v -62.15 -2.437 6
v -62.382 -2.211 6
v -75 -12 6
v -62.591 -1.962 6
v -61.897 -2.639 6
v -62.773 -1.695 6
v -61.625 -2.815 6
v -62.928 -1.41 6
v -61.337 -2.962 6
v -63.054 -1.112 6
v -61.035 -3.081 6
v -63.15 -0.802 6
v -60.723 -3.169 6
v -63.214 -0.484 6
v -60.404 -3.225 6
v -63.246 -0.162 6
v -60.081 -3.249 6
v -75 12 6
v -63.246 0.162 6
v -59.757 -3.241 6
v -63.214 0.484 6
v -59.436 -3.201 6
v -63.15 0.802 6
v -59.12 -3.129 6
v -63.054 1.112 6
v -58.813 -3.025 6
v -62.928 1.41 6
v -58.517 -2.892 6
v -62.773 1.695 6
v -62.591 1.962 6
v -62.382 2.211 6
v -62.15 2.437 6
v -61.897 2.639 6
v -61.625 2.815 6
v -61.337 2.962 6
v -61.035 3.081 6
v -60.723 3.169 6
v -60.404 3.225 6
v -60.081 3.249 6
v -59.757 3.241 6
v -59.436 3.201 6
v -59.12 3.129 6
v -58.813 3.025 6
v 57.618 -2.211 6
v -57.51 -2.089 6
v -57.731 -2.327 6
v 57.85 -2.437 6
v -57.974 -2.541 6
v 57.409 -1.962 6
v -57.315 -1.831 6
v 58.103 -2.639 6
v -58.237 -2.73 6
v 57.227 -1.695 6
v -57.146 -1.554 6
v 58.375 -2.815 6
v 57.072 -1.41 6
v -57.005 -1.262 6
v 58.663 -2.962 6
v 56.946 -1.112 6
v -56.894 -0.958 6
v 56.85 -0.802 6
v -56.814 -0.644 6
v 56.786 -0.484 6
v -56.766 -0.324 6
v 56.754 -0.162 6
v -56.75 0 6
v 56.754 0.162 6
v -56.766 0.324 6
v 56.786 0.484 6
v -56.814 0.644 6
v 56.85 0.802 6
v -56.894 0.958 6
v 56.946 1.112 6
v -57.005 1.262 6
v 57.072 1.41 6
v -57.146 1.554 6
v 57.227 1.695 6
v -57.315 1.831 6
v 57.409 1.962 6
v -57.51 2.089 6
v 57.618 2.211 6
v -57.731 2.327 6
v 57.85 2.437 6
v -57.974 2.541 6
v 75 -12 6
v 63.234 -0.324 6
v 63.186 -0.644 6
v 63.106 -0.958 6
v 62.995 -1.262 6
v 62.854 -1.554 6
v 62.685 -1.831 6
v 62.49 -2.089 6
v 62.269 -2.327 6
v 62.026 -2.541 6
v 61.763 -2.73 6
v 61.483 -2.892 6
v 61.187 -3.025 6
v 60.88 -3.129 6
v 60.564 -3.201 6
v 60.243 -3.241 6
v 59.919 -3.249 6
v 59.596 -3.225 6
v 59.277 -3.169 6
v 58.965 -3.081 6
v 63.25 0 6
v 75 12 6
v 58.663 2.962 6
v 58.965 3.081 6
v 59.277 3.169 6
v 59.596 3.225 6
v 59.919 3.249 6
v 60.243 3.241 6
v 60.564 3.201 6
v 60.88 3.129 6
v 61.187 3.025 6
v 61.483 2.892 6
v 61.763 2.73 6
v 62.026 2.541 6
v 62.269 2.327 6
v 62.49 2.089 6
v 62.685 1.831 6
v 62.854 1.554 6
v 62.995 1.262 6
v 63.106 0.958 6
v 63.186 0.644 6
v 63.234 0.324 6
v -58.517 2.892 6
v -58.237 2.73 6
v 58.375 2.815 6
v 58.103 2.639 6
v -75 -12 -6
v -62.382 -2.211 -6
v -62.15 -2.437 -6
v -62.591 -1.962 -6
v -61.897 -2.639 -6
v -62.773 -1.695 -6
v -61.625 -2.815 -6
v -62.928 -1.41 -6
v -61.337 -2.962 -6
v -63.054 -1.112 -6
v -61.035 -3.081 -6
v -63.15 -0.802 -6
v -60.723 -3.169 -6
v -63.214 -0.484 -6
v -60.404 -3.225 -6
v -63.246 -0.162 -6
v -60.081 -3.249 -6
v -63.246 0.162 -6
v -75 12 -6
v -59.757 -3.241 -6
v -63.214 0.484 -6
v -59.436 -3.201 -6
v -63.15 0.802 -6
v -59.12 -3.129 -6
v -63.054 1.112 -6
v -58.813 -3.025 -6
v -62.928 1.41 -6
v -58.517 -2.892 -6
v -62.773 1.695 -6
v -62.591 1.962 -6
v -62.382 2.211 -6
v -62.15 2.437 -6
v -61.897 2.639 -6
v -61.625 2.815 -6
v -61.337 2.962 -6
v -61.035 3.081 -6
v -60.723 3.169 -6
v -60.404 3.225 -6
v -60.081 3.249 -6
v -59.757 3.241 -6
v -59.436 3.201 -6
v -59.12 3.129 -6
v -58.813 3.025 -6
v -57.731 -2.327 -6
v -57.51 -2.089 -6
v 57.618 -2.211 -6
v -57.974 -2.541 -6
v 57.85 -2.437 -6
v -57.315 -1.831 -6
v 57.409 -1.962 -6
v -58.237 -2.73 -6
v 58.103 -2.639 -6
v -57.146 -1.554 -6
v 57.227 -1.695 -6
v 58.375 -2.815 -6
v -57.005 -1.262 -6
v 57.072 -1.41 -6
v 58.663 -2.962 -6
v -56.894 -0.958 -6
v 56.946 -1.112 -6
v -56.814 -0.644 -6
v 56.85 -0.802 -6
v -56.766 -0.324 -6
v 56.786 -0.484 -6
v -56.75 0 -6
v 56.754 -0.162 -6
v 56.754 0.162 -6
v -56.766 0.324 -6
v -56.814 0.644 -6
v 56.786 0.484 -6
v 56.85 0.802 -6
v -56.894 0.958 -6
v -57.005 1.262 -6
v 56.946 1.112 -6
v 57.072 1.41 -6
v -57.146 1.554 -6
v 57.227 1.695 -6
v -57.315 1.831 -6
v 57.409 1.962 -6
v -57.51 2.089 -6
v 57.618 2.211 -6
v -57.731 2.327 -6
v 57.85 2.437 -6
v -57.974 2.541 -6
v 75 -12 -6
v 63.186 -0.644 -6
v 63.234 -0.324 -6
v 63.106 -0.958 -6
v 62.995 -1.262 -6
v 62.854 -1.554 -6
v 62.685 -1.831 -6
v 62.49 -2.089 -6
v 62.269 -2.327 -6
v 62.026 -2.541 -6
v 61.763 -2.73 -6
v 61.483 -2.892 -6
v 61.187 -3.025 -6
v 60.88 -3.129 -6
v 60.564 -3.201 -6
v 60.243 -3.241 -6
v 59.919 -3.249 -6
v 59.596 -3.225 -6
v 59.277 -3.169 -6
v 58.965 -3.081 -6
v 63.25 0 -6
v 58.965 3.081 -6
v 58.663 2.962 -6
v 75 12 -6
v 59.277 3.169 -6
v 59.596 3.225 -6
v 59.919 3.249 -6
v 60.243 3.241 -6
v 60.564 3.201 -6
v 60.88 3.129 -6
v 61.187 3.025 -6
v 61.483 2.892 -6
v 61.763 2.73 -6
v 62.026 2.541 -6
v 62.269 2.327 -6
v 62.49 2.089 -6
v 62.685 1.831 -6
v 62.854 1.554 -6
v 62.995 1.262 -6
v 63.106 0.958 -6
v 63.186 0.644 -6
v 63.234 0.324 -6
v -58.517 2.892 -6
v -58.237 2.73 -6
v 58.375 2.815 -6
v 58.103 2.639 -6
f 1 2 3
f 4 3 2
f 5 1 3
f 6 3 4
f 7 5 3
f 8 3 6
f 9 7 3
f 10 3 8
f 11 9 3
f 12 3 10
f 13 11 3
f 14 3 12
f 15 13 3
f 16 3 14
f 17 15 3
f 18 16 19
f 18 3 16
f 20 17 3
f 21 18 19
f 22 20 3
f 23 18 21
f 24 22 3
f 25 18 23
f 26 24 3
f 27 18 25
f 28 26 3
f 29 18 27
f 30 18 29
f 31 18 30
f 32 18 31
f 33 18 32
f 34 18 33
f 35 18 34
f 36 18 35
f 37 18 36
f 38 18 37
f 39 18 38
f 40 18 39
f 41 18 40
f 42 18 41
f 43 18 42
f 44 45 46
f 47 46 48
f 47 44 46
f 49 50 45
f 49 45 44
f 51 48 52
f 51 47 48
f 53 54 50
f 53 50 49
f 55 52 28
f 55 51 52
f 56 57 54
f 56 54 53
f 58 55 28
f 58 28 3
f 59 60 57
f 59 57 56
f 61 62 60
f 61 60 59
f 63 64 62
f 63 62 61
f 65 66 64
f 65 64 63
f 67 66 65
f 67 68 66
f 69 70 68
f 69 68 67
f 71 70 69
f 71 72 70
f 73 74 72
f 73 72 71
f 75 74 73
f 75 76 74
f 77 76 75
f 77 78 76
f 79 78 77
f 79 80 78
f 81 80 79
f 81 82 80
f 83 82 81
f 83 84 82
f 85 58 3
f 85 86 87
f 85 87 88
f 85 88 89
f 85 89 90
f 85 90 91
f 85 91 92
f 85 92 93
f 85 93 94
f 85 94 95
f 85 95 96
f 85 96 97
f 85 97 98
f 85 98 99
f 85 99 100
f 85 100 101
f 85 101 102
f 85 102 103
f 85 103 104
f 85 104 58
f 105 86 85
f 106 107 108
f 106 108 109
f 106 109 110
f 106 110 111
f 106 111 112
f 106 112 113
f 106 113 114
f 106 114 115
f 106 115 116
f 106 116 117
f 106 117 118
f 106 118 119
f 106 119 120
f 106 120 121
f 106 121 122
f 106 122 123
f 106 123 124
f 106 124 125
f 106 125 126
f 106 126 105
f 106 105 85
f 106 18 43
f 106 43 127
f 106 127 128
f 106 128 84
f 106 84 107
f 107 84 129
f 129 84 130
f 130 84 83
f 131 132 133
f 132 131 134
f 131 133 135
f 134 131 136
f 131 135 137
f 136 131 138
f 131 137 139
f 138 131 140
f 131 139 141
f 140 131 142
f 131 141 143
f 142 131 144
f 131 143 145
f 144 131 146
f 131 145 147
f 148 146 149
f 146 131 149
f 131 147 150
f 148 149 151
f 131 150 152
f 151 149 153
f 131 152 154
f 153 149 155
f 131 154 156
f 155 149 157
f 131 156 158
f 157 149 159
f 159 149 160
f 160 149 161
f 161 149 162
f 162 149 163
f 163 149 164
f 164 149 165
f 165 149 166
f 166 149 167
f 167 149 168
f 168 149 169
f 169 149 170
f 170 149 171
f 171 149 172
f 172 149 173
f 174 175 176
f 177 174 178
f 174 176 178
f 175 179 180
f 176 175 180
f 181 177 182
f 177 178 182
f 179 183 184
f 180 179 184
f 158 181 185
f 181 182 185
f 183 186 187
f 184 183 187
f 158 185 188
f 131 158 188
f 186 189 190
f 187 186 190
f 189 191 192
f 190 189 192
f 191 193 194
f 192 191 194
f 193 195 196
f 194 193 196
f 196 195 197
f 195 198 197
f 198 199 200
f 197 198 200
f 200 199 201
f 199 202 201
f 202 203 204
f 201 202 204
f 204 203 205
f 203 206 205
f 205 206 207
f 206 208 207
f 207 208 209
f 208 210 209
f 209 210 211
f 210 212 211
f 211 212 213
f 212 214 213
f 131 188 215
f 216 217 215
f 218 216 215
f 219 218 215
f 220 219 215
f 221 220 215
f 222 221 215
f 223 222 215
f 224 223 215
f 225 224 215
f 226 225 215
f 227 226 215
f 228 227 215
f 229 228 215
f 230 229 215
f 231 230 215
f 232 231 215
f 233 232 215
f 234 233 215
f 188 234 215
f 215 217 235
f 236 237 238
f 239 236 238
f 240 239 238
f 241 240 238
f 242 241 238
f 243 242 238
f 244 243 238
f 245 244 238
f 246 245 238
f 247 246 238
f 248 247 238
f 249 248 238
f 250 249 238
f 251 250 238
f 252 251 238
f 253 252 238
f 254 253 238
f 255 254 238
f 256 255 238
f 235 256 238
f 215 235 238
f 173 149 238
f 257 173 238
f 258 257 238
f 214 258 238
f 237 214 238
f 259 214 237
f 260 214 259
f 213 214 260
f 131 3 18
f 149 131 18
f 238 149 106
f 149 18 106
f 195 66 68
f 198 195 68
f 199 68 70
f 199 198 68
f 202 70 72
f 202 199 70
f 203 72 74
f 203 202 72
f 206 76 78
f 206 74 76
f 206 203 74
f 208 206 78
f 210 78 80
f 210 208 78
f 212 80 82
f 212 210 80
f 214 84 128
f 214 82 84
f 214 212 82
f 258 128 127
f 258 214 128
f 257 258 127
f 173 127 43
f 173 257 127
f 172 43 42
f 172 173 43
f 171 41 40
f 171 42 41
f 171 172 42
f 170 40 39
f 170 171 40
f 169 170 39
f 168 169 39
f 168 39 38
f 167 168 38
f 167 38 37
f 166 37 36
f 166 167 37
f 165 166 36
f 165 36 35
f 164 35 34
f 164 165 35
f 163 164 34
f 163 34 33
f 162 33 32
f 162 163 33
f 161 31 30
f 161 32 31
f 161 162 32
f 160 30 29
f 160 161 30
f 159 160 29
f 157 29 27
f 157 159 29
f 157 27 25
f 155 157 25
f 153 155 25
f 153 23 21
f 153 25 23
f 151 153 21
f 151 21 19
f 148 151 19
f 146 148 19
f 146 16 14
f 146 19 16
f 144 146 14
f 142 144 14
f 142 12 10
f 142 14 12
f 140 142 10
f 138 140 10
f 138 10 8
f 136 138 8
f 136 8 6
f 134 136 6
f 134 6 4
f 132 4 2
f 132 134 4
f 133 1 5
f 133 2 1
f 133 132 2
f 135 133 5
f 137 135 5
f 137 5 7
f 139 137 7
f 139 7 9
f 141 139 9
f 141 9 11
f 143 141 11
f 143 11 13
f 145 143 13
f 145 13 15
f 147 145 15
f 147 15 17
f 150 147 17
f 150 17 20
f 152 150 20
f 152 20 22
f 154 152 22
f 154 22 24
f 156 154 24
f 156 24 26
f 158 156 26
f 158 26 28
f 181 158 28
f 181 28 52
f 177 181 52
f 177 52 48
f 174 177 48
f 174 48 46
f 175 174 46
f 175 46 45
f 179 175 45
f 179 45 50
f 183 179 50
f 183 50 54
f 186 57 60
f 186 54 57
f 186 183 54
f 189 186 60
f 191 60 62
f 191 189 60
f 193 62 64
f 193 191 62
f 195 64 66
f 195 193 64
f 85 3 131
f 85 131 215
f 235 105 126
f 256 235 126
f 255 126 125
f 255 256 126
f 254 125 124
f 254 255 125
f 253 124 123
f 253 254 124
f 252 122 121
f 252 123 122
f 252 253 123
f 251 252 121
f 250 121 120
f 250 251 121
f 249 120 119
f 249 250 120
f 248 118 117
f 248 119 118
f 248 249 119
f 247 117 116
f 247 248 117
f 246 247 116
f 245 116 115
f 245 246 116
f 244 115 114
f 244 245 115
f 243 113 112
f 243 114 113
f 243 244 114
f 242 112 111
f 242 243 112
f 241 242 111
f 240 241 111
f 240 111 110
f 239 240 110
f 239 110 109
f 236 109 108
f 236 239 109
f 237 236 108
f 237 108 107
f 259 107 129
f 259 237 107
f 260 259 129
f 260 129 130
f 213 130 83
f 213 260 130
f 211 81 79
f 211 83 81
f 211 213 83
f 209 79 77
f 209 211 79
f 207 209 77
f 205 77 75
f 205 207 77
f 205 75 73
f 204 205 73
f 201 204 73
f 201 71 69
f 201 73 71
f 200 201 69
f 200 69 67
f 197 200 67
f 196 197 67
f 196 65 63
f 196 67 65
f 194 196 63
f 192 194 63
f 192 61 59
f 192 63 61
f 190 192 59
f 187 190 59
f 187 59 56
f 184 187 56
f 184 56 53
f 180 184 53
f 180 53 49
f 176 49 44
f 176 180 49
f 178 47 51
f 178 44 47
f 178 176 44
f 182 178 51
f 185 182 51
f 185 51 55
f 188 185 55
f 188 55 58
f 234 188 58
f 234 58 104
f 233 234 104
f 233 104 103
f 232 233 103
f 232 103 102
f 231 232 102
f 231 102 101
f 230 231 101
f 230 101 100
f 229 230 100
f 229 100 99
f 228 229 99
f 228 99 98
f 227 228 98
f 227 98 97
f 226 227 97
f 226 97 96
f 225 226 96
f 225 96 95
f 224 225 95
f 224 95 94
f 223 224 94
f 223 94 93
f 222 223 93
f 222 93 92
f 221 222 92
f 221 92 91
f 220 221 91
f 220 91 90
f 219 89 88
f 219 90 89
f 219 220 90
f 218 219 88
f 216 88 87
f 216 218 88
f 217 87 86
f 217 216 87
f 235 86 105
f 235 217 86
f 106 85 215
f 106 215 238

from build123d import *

# Parameters (mm, degrees)
SKETCH2_W               = 150
SKETCH2_H               = 24
BOSS_EXTRUDE1_DEPTH     = 6
CUT_EXTRUDE1_DEPTH      = 77.896033708
CUT_EXTRUDE1_DEPTH_BACK = 77.896033708
SKETCH3_R               = 3.25


with BuildPart() as part:
    # Sketch2 → Boss-Extrude1 (new, symmetric)
    with BuildSketch(Plane.XY):
        Rectangle(SKETCH2_W, SKETCH2_H)
    extrude(amount=BOSS_EXTRUDE1_DEPTH, both=True)

    # Sketch3 → Cut-Extrude1 (cut, two sides: drawn at the far end of the back side and taken through both)
    with BuildSketch(Plane.XY.offset(6).offset(-CUT_EXTRUDE1_DEPTH_BACK)):
        with Locations((-60, 0)):
            Circle(SKETCH3_R)
        with Locations((60, 0)):
            Circle(SKETCH3_R)
    extrude(amount=CUT_EXTRUDE1_DEPTH + CUT_EXTRUDE1_DEPTH_BACK, mode=Mode.SUBTRACT)


solid = part.part
